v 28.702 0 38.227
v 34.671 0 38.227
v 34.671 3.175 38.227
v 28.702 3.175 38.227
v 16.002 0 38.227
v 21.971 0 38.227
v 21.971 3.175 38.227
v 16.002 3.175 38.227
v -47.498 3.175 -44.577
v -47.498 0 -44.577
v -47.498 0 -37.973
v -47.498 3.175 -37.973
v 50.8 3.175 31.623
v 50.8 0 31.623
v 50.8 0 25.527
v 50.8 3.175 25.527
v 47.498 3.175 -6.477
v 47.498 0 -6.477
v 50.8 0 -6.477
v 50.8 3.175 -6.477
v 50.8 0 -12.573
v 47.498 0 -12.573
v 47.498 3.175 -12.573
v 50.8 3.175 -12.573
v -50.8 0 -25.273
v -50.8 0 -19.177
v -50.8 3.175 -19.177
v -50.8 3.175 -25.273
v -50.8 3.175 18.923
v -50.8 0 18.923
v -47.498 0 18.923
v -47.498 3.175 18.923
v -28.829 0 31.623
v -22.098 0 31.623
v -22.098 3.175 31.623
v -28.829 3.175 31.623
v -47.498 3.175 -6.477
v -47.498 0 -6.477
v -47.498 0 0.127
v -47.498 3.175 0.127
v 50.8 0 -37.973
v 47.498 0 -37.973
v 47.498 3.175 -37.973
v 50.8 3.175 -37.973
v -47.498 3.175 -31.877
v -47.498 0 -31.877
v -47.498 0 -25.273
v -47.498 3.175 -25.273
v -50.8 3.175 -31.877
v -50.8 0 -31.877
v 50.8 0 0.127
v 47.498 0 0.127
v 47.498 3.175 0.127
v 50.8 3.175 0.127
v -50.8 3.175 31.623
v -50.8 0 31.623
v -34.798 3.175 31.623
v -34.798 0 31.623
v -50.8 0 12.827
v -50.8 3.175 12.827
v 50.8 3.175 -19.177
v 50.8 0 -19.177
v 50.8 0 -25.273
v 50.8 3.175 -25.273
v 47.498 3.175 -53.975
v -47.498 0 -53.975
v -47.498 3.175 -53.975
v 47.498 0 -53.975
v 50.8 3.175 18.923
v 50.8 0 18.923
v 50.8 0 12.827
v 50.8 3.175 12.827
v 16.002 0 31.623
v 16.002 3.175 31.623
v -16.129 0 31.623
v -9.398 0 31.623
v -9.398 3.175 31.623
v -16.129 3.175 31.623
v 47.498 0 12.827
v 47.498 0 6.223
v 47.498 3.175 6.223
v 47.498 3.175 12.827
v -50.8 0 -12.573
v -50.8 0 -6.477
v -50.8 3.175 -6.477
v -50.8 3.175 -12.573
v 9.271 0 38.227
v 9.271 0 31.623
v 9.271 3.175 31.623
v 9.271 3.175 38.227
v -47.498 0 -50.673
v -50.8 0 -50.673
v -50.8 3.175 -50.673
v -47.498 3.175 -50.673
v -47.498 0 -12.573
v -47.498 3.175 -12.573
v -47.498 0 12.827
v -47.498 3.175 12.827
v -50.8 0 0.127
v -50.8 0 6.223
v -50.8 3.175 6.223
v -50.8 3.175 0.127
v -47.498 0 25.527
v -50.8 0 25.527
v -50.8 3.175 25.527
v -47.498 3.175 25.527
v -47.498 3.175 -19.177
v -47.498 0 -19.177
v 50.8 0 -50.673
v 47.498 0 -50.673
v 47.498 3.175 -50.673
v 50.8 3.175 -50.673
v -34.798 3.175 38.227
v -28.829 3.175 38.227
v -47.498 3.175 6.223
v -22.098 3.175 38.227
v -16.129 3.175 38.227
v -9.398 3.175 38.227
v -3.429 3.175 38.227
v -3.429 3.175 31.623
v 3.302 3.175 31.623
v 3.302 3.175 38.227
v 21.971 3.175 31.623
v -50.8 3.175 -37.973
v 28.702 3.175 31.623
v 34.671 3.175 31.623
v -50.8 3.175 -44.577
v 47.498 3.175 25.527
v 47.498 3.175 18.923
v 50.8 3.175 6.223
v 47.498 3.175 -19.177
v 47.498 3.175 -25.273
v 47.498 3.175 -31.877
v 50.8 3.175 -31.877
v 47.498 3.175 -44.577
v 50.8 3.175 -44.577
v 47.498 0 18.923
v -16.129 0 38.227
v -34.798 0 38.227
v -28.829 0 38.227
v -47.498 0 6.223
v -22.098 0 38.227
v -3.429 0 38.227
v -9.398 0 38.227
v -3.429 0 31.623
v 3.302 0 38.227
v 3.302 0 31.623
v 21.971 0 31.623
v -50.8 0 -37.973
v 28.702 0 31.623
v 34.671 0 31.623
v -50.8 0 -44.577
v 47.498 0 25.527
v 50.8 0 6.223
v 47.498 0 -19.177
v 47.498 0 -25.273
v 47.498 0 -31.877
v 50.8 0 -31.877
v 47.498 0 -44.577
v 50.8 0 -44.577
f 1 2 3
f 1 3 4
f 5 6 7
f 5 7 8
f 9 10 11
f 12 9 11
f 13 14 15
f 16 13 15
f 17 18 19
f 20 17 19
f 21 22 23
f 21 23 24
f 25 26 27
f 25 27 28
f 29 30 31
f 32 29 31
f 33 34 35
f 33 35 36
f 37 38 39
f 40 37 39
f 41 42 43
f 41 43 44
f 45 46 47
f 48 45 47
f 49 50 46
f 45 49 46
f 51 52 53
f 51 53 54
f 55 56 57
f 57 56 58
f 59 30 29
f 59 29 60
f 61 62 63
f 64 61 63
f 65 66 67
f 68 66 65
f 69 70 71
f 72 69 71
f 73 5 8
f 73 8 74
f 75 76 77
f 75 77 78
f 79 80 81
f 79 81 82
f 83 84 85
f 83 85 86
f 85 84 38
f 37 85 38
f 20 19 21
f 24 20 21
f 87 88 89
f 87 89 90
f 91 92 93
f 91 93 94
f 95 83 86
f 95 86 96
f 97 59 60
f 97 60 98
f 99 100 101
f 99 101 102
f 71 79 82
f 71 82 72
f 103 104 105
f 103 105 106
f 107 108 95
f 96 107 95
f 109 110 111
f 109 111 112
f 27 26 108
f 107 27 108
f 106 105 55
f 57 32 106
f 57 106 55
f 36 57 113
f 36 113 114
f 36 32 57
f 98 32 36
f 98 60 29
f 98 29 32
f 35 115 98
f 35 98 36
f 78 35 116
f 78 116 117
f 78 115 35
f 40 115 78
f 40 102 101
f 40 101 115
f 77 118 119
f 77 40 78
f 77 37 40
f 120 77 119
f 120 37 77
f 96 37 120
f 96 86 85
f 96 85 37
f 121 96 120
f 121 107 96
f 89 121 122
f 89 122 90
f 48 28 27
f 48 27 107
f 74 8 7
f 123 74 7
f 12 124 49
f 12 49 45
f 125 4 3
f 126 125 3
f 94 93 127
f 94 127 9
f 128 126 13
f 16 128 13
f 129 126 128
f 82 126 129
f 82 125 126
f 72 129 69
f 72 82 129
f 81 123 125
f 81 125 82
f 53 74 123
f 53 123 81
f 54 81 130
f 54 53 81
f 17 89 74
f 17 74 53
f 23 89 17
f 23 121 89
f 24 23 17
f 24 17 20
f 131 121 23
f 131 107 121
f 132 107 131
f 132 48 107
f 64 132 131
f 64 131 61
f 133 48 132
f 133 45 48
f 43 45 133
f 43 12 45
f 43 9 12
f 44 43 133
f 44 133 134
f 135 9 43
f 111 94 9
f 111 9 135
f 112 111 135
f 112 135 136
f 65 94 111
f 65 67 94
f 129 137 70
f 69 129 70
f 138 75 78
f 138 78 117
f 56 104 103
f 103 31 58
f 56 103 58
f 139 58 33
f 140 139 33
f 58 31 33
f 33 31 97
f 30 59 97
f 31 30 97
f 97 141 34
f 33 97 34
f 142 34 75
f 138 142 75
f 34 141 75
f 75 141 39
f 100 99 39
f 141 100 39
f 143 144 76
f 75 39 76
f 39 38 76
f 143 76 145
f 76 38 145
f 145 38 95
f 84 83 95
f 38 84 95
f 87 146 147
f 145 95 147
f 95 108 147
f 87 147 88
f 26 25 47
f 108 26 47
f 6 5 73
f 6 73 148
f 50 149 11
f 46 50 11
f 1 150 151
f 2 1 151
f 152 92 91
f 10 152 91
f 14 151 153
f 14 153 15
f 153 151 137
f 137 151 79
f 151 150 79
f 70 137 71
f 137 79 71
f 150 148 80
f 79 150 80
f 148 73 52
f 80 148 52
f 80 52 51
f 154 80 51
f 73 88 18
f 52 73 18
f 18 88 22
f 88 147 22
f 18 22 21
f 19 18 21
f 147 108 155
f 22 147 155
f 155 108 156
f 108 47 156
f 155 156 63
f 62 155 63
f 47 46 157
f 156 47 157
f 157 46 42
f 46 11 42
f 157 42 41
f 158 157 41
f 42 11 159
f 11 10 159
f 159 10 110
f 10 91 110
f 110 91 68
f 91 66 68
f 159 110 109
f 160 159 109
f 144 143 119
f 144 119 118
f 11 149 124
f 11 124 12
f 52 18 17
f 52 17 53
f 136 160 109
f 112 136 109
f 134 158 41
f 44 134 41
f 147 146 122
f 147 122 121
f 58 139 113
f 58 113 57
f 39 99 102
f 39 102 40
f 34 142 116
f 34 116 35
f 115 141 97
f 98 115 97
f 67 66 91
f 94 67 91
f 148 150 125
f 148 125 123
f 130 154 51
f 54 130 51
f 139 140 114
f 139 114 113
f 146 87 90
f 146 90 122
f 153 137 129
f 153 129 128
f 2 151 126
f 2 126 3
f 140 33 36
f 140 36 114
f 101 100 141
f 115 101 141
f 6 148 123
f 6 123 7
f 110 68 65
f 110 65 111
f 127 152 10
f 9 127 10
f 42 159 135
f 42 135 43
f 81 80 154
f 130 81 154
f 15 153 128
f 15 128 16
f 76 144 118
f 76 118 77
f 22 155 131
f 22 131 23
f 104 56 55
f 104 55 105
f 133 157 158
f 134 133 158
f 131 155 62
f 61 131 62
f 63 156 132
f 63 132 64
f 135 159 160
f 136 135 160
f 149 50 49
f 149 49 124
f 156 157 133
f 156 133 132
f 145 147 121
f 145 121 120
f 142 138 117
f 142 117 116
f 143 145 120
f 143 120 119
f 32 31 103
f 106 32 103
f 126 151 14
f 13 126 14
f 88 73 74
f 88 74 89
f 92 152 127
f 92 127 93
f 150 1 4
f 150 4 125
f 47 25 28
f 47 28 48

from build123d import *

# Parameters (mm, degrees)
SKETCH1_W           = 101.6
SKETCH1_H           = 107.95
BOSS_EXTRUDE1_DEPTH = 3.175
SKETCH2_W           = 3.302
SKETCH2_H           = 6.604
CUT_EXTRUDE1_DEPTH  = 75.189091179


with BuildPart() as part:
    # Sketch1 → Boss-Extrude1 (new body)
    with BuildSketch(Plane(origin=(0, 0, 0), x_dir=(1, 0, 0), z_dir=(0, 1, 0))):
        Rectangle(SKETCH1_W, SKETCH1_H)
    extrude(amount=BOSS_EXTRUDE1_DEPTH)

    # Sketch2 → Cut-Extrude1 (cut, through all)
    with BuildSketch(Plane.XZ):
        Polygon((-34.798, 31.623), (-47.498, 31.623), (-50.8, 31.623), (-50.8, 38.227), (-50.8, 53.975), (50.8, 53.975), (50.8, 38.227), (50.8, 31.623), (47.498, 31.623), (34.671, 31.623), (34.671, 38.227), (28.702, 38.227), (28.702, 31.623), (21.971, 31.623), (21.971, 38.227), (16.002, 38.227), (16.002, 31.623), (9.271, 31.623), (9.271, 38.227), (3.302, 38.227), (3.302, 31.623), (-3.429, 31.623), (-3.429, 38.227), (-9.398, 38.227), (-9.398, 31.623), (-16.129, 31.623), (-16.129, 38.227), (-22.098, 38.227), (-22.098, 31.623), (-28.829, 31.623), (-28.829, 38.227), (-34.798, 38.227), align=None)
        with Locations((49.149, 22.225)):
            Rectangle(SKETCH2_W, SKETCH2_H)
        with Locations((49.149, 9.525)):
            Rectangle(SKETCH2_W, SKETCH2_H)
        with Locations((49.149, -3.175)):
            Rectangle(SKETCH2_W, SKETCH2_H)
        with Locations((49.149, -15.875)):
            Rectangle(SKETCH2_W, SKETCH2_H)
        with Locations((49.149, -28.575)):
            Rectangle(SKETCH2_W, SKETCH2_H)
        with Locations((49.149, -41.275)):
            Rectangle(SKETCH2_W, SKETCH2_H)
        with Locations((49.149, -53.975)):
            Rectangle(SKETCH2_W, SKETCH2_H)
        with Locations((-49.149, -53.975)):
            Rectangle(SKETCH2_W, SKETCH2_H)
        with Locations((-49.149, -41.275)):
            Rectangle(SKETCH2_W, SKETCH2_H)
        with Locations((-49.149, -28.575)):
            Rectangle(SKETCH2_W, SKETCH2_H)
        with Locations((-49.149, -15.875)):
            Rectangle(SKETCH2_W, SKETCH2_H)
        with Locations((-49.149, -3.175)):
            Rectangle(SKETCH2_W, SKETCH2_H)
        with Locations((-49.149, 9.525)):
            Rectangle(SKETCH2_W, SKETCH2_H)
        with Locations((-49.149, 22.225)):
            Rectangle(SKETCH2_W, SKETCH2_H)
    extrude(amount=-CUT_EXTRUDE1_DEPTH, mode=Mode.SUBTRACT)


solid = part.part
